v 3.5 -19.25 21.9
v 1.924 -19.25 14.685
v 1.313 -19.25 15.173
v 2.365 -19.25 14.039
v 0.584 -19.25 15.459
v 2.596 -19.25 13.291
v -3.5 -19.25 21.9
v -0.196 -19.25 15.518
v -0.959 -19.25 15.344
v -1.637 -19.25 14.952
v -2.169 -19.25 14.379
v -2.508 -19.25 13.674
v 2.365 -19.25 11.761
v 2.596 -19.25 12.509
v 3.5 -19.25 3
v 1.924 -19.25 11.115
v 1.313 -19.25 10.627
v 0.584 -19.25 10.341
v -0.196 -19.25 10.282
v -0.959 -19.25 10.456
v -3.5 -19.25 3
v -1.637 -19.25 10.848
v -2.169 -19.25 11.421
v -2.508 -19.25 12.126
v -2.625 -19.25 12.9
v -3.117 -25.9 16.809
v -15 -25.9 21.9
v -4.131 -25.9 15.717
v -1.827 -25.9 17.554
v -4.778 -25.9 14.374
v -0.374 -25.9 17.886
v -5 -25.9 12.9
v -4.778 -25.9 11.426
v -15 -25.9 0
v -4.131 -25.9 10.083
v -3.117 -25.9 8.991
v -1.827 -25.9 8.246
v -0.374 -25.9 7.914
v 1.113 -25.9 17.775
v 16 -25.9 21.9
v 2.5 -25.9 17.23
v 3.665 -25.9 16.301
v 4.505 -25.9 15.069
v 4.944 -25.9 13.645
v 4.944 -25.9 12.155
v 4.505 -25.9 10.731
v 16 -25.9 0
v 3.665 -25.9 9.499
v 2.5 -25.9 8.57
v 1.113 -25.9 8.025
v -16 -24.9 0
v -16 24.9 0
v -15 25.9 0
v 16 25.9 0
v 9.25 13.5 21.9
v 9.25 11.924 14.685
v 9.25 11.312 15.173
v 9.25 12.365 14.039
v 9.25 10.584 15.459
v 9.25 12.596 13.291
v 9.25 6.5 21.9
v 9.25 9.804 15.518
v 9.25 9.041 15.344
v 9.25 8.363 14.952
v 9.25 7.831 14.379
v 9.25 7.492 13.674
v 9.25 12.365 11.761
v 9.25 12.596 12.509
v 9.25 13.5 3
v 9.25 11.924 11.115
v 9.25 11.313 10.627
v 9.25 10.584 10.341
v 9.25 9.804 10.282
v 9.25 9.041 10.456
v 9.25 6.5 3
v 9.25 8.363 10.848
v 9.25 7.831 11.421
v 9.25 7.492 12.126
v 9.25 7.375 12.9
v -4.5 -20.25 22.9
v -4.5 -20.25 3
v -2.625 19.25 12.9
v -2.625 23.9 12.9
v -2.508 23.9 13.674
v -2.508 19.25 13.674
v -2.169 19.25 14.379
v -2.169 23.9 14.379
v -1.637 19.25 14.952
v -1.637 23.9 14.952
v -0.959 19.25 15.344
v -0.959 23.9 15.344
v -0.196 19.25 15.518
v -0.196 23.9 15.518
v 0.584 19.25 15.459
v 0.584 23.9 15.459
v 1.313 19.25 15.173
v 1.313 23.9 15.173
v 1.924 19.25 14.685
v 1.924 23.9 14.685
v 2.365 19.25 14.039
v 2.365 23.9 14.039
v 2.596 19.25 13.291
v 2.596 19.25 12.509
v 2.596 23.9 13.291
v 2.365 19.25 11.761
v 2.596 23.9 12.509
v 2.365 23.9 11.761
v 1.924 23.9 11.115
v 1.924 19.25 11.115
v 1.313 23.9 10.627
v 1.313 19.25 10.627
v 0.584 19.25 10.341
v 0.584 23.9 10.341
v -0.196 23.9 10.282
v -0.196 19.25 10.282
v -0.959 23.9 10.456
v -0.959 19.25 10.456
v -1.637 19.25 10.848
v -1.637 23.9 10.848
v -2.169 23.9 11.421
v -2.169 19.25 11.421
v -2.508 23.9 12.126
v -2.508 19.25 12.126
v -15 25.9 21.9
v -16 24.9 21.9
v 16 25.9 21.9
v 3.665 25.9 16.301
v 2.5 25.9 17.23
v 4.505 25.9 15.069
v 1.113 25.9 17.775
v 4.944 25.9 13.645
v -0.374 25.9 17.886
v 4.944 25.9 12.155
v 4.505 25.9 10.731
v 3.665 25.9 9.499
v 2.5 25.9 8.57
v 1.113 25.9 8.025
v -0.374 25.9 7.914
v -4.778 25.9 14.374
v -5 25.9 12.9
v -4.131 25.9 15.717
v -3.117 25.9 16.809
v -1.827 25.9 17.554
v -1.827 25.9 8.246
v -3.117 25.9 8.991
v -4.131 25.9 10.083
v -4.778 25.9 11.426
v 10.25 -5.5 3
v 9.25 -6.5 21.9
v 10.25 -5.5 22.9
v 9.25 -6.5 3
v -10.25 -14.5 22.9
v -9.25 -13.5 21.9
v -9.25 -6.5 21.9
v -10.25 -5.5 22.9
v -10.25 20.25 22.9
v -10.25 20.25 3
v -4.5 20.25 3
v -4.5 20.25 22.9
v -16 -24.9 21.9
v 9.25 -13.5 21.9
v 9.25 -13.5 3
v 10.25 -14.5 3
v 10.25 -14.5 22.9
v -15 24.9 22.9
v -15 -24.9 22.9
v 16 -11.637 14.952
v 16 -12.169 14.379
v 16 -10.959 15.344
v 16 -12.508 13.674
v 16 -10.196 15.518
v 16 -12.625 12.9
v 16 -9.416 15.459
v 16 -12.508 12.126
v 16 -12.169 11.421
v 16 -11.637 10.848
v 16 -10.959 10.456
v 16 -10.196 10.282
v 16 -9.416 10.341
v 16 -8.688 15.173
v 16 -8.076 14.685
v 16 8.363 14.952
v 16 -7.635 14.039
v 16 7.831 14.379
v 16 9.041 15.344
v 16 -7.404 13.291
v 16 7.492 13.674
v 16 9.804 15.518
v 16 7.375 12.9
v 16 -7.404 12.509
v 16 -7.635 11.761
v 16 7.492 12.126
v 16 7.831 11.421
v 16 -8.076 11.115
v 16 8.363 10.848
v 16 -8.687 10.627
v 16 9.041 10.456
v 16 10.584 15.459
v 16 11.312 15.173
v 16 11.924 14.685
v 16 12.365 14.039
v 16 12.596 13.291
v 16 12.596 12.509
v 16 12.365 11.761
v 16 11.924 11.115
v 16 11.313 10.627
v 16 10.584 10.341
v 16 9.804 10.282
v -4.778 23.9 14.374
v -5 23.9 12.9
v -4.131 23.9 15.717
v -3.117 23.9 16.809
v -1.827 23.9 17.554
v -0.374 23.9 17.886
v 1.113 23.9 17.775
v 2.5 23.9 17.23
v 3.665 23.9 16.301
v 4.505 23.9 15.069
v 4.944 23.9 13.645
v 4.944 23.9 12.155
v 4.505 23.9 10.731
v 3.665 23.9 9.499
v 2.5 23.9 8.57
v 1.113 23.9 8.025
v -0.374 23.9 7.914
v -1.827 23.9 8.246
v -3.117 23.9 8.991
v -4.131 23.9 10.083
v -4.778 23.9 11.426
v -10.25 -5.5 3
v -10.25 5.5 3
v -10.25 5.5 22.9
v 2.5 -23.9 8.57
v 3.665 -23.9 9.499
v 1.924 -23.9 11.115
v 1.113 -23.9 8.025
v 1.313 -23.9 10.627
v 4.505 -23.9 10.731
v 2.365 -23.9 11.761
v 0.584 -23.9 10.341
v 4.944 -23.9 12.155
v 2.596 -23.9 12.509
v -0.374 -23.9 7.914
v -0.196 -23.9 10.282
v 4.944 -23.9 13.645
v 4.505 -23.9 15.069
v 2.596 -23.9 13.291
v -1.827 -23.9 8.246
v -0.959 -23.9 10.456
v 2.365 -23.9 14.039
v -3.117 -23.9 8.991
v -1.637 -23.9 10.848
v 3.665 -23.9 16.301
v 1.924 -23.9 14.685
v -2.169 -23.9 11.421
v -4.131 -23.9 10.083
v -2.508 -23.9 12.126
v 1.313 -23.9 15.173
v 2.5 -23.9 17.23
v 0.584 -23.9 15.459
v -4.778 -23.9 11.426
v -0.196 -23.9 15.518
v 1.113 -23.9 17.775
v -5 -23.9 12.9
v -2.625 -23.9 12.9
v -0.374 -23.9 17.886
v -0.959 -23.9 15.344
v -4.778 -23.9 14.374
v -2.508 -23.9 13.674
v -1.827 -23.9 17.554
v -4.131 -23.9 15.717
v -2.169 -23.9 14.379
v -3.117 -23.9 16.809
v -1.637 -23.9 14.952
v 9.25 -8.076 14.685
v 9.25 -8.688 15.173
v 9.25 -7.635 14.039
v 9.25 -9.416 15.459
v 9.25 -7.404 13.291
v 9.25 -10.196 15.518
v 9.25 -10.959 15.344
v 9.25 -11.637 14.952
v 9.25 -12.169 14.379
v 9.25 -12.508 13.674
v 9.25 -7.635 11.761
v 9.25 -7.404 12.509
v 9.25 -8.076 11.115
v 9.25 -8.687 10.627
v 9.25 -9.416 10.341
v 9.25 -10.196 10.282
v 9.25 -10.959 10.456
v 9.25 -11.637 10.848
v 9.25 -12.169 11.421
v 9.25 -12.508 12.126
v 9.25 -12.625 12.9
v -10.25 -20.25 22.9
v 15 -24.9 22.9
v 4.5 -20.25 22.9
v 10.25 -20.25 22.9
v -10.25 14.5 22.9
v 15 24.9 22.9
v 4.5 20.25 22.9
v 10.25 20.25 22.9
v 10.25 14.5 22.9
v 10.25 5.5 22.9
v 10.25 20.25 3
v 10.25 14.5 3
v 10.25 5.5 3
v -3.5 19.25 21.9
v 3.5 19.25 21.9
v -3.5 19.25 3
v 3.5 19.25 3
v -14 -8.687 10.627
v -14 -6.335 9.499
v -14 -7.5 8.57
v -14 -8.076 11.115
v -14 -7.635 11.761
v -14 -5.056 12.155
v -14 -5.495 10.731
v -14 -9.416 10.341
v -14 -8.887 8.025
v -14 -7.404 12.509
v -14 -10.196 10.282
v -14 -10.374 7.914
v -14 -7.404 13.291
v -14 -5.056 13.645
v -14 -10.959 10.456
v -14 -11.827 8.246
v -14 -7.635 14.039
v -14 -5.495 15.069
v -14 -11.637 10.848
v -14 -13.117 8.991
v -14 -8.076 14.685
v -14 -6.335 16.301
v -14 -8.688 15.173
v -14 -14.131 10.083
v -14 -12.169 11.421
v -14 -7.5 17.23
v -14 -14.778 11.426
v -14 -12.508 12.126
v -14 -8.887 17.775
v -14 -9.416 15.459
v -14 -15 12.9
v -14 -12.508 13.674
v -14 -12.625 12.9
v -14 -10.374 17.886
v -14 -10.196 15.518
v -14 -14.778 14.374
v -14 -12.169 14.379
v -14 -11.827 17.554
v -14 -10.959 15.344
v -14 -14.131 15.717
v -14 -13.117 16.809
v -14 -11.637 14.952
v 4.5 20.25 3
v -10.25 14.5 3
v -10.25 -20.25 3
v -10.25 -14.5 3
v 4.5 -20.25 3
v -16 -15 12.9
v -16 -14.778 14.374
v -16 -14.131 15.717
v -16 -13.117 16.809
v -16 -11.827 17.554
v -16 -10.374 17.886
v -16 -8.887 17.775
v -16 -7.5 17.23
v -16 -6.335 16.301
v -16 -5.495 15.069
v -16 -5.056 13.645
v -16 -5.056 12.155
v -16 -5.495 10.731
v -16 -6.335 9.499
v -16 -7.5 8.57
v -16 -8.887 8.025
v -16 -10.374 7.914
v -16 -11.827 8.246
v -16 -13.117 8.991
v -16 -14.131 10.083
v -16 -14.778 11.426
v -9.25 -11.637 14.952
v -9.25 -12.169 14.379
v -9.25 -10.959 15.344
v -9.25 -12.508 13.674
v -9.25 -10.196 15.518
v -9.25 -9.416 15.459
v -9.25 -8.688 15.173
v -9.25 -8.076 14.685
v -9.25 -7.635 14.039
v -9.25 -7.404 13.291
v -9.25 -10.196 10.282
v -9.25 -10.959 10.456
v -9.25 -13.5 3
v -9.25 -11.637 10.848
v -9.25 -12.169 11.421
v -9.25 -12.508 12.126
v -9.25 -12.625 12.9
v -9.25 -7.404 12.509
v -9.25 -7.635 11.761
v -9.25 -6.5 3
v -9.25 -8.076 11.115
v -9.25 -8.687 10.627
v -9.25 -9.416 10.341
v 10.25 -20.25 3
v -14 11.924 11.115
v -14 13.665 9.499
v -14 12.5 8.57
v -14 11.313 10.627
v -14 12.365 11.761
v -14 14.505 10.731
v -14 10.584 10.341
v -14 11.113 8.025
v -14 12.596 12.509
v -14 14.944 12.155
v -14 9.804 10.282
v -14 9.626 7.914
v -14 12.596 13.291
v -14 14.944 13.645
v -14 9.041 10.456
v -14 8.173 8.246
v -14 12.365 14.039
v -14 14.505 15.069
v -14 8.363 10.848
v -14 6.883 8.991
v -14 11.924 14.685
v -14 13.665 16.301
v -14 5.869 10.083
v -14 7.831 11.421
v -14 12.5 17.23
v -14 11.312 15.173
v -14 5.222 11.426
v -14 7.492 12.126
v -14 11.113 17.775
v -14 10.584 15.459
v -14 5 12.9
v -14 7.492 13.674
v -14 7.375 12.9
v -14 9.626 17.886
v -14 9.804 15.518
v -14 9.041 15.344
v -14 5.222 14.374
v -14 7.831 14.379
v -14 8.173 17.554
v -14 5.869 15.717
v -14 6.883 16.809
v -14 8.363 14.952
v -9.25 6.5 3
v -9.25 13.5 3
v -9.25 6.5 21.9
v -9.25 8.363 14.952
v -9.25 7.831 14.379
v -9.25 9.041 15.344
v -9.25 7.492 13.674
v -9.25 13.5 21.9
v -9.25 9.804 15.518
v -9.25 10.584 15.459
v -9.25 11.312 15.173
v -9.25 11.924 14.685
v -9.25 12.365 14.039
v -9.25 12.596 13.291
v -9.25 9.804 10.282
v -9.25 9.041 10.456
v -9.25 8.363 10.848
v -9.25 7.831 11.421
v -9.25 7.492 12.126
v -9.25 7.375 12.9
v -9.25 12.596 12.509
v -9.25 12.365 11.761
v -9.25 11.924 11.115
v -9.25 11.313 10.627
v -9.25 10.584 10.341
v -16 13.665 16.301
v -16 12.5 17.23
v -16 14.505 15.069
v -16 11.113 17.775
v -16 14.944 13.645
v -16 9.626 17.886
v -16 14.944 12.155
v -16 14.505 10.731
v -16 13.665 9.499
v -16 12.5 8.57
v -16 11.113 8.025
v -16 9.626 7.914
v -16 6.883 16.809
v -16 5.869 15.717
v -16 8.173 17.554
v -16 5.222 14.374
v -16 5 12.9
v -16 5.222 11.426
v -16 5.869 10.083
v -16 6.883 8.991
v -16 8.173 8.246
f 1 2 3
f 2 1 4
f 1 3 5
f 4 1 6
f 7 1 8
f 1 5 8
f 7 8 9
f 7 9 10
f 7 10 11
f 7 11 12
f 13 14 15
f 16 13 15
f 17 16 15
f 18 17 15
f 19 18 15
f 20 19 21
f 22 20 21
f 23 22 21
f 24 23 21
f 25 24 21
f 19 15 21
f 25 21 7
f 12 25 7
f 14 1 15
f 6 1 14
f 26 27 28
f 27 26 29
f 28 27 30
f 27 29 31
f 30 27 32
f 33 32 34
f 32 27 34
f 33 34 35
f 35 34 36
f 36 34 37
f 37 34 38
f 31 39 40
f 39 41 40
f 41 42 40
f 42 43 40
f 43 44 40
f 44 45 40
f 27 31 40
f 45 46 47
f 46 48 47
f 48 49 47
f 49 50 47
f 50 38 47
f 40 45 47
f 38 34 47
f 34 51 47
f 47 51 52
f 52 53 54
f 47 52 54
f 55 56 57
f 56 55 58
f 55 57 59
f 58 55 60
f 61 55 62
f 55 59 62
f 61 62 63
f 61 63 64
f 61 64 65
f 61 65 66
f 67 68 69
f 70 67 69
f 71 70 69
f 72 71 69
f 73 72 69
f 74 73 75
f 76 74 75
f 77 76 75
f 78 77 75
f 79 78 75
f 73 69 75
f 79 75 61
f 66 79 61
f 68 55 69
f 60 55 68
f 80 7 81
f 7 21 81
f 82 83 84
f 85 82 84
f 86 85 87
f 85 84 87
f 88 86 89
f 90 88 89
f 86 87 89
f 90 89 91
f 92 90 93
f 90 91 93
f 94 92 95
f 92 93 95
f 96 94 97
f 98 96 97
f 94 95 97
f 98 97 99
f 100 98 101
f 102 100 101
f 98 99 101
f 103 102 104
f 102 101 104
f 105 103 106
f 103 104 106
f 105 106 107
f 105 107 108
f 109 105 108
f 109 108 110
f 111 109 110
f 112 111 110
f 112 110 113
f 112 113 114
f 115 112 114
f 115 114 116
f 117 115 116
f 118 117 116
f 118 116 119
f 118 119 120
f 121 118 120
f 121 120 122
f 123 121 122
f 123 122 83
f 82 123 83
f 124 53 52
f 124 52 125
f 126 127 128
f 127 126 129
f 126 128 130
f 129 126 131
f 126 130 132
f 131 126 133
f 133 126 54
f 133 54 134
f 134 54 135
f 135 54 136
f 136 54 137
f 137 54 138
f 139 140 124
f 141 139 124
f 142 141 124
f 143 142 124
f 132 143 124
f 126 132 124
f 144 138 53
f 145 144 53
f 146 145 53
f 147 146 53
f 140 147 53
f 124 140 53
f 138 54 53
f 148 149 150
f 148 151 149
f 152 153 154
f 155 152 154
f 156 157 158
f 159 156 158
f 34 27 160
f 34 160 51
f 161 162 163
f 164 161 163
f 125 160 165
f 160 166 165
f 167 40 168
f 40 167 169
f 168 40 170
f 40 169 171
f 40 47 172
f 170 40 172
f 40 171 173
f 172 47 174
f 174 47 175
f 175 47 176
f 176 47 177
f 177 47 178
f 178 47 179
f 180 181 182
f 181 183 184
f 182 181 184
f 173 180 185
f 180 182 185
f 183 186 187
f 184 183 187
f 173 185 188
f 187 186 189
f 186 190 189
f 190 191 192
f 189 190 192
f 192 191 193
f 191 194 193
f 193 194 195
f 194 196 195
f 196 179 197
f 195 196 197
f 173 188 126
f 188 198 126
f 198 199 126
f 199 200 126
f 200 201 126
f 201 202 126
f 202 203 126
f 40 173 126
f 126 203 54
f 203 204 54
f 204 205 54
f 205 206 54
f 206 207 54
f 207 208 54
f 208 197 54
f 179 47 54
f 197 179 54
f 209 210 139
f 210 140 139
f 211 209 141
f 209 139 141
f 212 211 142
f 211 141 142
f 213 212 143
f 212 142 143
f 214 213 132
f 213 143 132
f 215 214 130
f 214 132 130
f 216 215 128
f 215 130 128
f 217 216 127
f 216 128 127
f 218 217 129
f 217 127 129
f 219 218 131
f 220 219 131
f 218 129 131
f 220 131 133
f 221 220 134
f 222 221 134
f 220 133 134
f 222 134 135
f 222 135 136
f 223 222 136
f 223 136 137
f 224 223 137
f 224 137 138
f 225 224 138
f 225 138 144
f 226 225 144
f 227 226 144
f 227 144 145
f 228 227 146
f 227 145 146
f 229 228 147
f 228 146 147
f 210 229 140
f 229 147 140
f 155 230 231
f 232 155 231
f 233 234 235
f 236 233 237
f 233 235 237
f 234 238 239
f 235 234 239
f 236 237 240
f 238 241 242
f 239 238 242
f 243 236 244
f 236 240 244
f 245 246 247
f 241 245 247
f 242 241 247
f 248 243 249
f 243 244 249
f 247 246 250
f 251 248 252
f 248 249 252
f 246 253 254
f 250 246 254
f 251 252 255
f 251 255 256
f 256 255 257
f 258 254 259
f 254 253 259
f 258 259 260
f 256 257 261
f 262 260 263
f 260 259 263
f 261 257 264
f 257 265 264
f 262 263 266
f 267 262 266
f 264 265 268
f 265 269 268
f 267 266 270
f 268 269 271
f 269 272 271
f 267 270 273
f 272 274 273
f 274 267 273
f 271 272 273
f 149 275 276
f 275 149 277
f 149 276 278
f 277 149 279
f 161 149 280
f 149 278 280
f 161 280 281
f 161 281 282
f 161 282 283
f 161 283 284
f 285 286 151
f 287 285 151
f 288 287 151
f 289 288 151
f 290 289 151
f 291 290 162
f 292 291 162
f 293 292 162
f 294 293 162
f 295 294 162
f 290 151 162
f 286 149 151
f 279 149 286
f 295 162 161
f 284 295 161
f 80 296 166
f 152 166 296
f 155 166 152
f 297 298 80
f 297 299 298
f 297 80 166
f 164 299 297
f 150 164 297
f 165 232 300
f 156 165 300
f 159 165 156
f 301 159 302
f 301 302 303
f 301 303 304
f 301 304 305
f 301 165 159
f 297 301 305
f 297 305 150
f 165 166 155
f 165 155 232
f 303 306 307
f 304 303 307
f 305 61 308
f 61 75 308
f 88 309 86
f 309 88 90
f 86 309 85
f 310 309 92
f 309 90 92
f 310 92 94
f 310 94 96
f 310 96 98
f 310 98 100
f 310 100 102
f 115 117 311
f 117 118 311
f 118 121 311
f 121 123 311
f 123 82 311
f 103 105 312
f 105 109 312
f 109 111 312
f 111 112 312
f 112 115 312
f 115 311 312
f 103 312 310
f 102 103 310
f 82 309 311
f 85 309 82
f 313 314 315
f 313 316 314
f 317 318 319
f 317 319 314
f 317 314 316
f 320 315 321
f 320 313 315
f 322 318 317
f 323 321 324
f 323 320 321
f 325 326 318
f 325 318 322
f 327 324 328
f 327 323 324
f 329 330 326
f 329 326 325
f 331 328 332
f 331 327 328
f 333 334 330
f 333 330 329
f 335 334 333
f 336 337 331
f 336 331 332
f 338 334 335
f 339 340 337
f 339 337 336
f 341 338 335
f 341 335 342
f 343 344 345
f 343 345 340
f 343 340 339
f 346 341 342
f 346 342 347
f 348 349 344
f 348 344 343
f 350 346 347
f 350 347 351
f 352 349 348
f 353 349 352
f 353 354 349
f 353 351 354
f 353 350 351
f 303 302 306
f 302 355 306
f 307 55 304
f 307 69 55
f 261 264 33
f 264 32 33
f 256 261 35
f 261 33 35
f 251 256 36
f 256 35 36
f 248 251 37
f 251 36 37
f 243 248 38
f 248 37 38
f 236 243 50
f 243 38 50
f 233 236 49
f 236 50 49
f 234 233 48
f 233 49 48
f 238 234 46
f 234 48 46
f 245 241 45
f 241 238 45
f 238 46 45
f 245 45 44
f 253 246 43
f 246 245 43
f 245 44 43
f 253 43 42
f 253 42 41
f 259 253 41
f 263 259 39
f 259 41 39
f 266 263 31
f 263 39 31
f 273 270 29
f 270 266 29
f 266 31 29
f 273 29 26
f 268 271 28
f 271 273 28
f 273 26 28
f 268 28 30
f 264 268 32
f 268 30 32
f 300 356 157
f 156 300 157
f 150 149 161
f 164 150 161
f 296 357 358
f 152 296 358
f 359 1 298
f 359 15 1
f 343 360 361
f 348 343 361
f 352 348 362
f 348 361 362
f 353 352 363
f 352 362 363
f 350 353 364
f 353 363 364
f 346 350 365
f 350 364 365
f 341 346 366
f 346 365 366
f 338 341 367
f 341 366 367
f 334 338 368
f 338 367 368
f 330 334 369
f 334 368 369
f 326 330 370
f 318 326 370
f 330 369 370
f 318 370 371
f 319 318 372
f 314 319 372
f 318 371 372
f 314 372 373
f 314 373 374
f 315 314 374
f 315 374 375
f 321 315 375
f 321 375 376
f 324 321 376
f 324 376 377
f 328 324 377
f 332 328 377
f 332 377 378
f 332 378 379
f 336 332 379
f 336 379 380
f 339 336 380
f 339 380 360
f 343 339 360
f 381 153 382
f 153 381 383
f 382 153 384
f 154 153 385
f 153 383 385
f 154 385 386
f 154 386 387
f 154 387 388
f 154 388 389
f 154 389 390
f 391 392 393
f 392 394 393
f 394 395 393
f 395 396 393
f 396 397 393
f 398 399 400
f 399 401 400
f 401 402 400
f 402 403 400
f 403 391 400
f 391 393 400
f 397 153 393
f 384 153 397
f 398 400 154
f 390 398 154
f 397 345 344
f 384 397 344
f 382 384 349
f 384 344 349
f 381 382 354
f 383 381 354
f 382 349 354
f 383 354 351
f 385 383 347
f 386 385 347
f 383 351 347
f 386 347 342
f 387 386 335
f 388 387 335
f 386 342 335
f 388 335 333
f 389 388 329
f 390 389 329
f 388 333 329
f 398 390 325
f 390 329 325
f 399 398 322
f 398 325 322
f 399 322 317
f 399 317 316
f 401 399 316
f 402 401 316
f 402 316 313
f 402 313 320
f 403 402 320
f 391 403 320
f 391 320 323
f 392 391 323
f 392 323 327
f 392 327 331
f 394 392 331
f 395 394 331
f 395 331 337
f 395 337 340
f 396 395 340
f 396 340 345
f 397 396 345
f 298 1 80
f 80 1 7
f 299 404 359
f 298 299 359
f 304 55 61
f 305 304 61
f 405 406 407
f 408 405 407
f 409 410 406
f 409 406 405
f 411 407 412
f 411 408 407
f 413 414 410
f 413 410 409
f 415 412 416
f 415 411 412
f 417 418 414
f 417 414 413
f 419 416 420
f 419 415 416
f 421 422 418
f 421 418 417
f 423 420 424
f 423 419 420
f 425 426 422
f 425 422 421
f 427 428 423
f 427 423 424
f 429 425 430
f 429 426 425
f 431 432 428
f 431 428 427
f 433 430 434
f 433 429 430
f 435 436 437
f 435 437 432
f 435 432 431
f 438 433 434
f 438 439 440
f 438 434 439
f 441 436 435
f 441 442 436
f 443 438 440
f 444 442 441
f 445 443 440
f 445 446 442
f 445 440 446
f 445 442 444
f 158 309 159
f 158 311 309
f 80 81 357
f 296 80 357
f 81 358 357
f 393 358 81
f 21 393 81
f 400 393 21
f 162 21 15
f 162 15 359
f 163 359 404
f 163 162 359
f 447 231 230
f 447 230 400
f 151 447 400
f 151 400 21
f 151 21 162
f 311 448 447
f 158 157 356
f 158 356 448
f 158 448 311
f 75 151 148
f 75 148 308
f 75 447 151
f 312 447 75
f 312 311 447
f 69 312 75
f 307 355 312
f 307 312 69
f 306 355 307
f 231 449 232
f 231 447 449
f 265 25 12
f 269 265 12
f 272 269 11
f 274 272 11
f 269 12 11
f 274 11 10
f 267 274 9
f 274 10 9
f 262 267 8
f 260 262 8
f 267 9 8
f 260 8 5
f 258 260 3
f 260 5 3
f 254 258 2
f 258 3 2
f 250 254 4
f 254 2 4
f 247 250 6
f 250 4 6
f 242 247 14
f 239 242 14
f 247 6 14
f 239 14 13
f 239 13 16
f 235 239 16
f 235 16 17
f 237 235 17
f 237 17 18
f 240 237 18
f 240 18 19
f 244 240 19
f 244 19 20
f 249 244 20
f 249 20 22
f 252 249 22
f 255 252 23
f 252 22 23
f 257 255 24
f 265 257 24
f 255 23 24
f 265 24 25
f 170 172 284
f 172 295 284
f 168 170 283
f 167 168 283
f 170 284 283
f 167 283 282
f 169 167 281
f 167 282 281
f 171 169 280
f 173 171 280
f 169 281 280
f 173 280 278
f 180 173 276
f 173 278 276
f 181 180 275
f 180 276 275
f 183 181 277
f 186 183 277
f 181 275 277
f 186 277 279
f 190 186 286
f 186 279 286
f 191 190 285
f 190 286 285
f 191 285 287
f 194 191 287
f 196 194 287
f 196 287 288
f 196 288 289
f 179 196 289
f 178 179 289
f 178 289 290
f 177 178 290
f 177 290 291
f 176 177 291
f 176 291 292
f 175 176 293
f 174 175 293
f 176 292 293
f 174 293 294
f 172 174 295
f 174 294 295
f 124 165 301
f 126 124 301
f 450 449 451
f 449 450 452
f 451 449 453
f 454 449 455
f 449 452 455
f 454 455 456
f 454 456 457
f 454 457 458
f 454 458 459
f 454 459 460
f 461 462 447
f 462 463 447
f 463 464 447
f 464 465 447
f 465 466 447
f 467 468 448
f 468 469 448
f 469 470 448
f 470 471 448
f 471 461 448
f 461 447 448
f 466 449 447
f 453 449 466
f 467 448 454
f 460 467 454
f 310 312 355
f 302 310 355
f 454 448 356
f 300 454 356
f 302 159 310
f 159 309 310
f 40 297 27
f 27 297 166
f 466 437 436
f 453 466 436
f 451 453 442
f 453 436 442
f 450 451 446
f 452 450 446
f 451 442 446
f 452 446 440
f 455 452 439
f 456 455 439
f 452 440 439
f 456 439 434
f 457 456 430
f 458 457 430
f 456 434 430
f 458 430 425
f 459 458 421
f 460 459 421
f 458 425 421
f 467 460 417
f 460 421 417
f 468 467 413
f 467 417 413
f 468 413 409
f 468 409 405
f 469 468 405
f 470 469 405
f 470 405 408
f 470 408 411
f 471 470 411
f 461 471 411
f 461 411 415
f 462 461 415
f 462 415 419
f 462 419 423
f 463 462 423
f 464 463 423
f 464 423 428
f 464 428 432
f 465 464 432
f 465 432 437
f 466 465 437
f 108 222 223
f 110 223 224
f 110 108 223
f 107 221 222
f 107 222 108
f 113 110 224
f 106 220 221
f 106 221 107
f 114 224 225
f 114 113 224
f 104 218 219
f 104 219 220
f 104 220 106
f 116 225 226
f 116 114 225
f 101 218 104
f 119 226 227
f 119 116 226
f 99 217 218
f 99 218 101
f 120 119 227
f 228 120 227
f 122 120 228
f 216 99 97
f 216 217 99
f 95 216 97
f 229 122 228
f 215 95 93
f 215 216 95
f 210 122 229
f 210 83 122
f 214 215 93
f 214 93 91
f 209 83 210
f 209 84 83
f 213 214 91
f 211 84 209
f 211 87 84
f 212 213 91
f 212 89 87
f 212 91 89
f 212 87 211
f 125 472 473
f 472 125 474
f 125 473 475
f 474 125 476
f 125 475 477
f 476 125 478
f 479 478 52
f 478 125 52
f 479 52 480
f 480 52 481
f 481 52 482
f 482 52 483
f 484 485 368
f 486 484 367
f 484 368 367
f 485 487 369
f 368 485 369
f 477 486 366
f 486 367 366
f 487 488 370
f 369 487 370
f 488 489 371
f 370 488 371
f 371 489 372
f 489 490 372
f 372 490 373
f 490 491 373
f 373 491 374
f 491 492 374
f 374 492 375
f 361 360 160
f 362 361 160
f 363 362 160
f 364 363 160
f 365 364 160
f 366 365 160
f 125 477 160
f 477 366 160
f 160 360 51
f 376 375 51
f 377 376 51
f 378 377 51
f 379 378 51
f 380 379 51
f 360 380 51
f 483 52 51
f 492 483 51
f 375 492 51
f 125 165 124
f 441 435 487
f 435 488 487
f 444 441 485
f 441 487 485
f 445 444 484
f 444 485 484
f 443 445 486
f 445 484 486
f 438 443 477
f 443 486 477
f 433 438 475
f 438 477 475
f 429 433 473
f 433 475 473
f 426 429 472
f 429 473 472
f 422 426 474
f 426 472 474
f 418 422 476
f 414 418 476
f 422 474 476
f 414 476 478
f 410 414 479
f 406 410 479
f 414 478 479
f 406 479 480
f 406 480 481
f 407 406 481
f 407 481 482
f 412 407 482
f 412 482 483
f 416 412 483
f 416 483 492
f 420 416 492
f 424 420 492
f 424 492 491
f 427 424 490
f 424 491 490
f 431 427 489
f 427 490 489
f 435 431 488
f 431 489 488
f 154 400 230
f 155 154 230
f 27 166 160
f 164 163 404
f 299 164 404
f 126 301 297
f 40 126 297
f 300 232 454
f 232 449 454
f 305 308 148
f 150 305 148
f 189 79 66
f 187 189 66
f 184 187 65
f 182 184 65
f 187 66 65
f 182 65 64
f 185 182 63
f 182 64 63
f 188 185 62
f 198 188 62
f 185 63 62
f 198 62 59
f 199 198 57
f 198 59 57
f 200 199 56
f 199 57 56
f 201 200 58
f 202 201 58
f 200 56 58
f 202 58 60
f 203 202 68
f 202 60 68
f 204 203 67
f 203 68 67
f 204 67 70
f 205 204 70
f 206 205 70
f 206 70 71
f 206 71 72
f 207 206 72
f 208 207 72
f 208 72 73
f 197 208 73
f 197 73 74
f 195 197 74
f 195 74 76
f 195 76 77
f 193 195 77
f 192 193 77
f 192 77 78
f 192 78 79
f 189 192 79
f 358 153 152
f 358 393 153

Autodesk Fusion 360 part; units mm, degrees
sketch "Main Profile" plane through (0, 0, 0) normal (0, 0, 1) x (1, 0, 0)
  line L0 (10.25, -20.25) -> (-10.25, -20.25)
  line L1 (-10.25, -20.25) -> (-10.25, 20.25)
  line L2 (-10.25, 20.25) -> (10.25, 20.25)
  line L3 (10.25, 20.25) -> (10.25, -20.25)
  line L4 (10.25, -20.25) -> (-10.25, 20.25) construction
  line L5 (-10.25, -20.25) -> (10.25, 20.25) construction
  line L6 (-16, -25.9) -> (16, -25.9)
  line L7 (16, -25.9) -> (16, 25.9)
  line L8 (16, 25.9) -> (-16, 25.9)
  line L9 (-16, 25.9) -> (-16, -25.9)
  line L10 (-16, -25.9) -> (16, 25.9) construction
  line L11 (16, -25.9) -> (-16, 25.9) construction
  line L12 (-3.5, 19.25) -> (3.5, 19.25)
  line L13 (3.5, 19.25) -> (4.5, 20.25)
  line L14 (-3.5, 19.25) -> (-4.5, 20.25)
  line L15 (0, 20.25) -> (0, 19.25) construction
  line L16 (-9.25, 6.5) -> (-9.25, 13.5)
  line L17 (-9.25, 13.5) -> (-10.25, 14.5)
  line L18 (-9.25, 6.5) -> (-10.25, 5.5)
  line L19 (9.25, 13.5) -> (9.25, 6.5)
  line L20 (9.25, 6.5) -> (10.25, 5.5)
  line L21 (9.25, 13.5) -> (10.25, 14.5)
  line L22 (9.25, -13.5) -> (10.25, -14.5)
  line L23 (9.25, -6.5) -> (9.25, -13.5)
  line L24 (9.25, -6.5) -> (10.25, -5.5)
  line L25 (3.5, -19.25) -> (4.5, -20.25)
  line L26 (3.5, -19.25) -> (-3.5, -19.25)
  line L27 (-3.5, -19.25) -> (-4.5, -20.25)
  line L28 (-9.25, -13.5) -> (-10.25, -14.5)
  line L29 (-9.25, -13.5) -> (-9.25, -6.5)
  line L30 (-9.25, -6.5) -> (-10.25, -5.5)
  point P0 (0, 10)
  dimension "d1" = 40.5
  dimension "d2" = 20.5
  dimension "d3" = 32
  dimension "d4" = 51.8
  dimension "d5" = 1
  dimension "d6" = 135
  dimension "d7" = 7
  dimension "d8" = 135
  dimension "d9" = 10.25
  dimension "d11" = 360
  dimension "d13" = 360
extrude "Extrude1" add sketch "Main Profile" along normal blind 3 contours L0 L1 L2 L3 L12 L13 L14 L16 L17 L18 L19 L20 L21 L22 L23 L24 L25 L26 L27 L28 L29 L30 | L0 L25 L26 L27 | L3 L22 L23 L24 | L3 L19 L20 L21 | L1 L28 L29 L30 | L1 L16 L17 L18 | L2 L12 L13 L14 | L6 L7 L8 L9
extrude "Extrude2" add sketch "Main Profile" along normal blind 22.9 contours L0 L25 L26 L27 | L3 L22 L23 L24 | L3 L19 L20 L21 | L1 L28 L29 L30 | L1 L16 L17 L18 | L2 L12 L13 L14 | L6 L7 L8 L9
sketch "Short Side" plane through (0, 25.9, 0) normal (0, 1, 0) x (-1, 0, 0)
  line L0 (-16, 0) -> (16, 0)
  line L1 (16, 0) -> (16, 22.9)
  line L2 (16, 22.9) -> (-16, 22.9)
  line L3 (-16, 22.9) -> (-16, 0)
  circle A0 centre (0, 12.9) radius 5
  circle A1 centre (0, 12.9) radius 2.625
  dimension "d18" = 10
  dimension "d19" = 5.25
  dimension "d20" = 12.9
extrude "Extrude3" cut sketch "Short Side" against normal blind 63.819 contours A1
extrude "Extrude4" cut sketch "Short Side" against normal blind 2 contours A0
extrude "Extrude5" cut sketch "Short Side" along normal blind 2 from surface at -51.8 contours A0
sketch "Long Side" plane through (-16, 0, 0) normal (-1, 0, 0) x (0, -1, 0)
  line L0 (-25.9, 0) -> (25.9, 0)
  line L1 (25.9, 0) -> (25.9, 22.9)
  line L2 (25.9, 22.9) -> (-25.9, 22.9)
  line L3 (-25.9, 22.9) -> (-25.9, 0)
  circle A0 centre (-10, 12.9) radius 5
  circle A1 centre (-10, 12.9) radius 2.625
  circle A2 centre (10, 12.9) radius 5
  circle A3 centre (10, 12.9) radius 2.625
  dimension "d28" = 10
  dimension "d29" = 5.25
  dimension "d30" = 10
  dimension "d31" = 12.9
  dimension "d34" = 20
  dimension "d35" = 0
extrude "Extrude6" cut sketch "Long Side" against normal blind 62.946 contours A1 | A3
extrude "Extrude7" cut sketch "Long Side" against normal blind 2 contours A0 | A2
chamfer "Chamfer1" distance 1 angle 45 12 edges at (9.25, 10, 22.9) (9.25, -10, 22.9) (-9.25, -10, 22.9) (0, -19.25, 22.9) (-9.25, 10, 22.9) (0, 19.25, 22.9) (0, 25.9, 22.9) (16, 0, 22.9) (0, -25.9, 22.9) (-16, 0, 22.9) (-16, -25.9, 11.45) (-16, 25.9, 11.45)
